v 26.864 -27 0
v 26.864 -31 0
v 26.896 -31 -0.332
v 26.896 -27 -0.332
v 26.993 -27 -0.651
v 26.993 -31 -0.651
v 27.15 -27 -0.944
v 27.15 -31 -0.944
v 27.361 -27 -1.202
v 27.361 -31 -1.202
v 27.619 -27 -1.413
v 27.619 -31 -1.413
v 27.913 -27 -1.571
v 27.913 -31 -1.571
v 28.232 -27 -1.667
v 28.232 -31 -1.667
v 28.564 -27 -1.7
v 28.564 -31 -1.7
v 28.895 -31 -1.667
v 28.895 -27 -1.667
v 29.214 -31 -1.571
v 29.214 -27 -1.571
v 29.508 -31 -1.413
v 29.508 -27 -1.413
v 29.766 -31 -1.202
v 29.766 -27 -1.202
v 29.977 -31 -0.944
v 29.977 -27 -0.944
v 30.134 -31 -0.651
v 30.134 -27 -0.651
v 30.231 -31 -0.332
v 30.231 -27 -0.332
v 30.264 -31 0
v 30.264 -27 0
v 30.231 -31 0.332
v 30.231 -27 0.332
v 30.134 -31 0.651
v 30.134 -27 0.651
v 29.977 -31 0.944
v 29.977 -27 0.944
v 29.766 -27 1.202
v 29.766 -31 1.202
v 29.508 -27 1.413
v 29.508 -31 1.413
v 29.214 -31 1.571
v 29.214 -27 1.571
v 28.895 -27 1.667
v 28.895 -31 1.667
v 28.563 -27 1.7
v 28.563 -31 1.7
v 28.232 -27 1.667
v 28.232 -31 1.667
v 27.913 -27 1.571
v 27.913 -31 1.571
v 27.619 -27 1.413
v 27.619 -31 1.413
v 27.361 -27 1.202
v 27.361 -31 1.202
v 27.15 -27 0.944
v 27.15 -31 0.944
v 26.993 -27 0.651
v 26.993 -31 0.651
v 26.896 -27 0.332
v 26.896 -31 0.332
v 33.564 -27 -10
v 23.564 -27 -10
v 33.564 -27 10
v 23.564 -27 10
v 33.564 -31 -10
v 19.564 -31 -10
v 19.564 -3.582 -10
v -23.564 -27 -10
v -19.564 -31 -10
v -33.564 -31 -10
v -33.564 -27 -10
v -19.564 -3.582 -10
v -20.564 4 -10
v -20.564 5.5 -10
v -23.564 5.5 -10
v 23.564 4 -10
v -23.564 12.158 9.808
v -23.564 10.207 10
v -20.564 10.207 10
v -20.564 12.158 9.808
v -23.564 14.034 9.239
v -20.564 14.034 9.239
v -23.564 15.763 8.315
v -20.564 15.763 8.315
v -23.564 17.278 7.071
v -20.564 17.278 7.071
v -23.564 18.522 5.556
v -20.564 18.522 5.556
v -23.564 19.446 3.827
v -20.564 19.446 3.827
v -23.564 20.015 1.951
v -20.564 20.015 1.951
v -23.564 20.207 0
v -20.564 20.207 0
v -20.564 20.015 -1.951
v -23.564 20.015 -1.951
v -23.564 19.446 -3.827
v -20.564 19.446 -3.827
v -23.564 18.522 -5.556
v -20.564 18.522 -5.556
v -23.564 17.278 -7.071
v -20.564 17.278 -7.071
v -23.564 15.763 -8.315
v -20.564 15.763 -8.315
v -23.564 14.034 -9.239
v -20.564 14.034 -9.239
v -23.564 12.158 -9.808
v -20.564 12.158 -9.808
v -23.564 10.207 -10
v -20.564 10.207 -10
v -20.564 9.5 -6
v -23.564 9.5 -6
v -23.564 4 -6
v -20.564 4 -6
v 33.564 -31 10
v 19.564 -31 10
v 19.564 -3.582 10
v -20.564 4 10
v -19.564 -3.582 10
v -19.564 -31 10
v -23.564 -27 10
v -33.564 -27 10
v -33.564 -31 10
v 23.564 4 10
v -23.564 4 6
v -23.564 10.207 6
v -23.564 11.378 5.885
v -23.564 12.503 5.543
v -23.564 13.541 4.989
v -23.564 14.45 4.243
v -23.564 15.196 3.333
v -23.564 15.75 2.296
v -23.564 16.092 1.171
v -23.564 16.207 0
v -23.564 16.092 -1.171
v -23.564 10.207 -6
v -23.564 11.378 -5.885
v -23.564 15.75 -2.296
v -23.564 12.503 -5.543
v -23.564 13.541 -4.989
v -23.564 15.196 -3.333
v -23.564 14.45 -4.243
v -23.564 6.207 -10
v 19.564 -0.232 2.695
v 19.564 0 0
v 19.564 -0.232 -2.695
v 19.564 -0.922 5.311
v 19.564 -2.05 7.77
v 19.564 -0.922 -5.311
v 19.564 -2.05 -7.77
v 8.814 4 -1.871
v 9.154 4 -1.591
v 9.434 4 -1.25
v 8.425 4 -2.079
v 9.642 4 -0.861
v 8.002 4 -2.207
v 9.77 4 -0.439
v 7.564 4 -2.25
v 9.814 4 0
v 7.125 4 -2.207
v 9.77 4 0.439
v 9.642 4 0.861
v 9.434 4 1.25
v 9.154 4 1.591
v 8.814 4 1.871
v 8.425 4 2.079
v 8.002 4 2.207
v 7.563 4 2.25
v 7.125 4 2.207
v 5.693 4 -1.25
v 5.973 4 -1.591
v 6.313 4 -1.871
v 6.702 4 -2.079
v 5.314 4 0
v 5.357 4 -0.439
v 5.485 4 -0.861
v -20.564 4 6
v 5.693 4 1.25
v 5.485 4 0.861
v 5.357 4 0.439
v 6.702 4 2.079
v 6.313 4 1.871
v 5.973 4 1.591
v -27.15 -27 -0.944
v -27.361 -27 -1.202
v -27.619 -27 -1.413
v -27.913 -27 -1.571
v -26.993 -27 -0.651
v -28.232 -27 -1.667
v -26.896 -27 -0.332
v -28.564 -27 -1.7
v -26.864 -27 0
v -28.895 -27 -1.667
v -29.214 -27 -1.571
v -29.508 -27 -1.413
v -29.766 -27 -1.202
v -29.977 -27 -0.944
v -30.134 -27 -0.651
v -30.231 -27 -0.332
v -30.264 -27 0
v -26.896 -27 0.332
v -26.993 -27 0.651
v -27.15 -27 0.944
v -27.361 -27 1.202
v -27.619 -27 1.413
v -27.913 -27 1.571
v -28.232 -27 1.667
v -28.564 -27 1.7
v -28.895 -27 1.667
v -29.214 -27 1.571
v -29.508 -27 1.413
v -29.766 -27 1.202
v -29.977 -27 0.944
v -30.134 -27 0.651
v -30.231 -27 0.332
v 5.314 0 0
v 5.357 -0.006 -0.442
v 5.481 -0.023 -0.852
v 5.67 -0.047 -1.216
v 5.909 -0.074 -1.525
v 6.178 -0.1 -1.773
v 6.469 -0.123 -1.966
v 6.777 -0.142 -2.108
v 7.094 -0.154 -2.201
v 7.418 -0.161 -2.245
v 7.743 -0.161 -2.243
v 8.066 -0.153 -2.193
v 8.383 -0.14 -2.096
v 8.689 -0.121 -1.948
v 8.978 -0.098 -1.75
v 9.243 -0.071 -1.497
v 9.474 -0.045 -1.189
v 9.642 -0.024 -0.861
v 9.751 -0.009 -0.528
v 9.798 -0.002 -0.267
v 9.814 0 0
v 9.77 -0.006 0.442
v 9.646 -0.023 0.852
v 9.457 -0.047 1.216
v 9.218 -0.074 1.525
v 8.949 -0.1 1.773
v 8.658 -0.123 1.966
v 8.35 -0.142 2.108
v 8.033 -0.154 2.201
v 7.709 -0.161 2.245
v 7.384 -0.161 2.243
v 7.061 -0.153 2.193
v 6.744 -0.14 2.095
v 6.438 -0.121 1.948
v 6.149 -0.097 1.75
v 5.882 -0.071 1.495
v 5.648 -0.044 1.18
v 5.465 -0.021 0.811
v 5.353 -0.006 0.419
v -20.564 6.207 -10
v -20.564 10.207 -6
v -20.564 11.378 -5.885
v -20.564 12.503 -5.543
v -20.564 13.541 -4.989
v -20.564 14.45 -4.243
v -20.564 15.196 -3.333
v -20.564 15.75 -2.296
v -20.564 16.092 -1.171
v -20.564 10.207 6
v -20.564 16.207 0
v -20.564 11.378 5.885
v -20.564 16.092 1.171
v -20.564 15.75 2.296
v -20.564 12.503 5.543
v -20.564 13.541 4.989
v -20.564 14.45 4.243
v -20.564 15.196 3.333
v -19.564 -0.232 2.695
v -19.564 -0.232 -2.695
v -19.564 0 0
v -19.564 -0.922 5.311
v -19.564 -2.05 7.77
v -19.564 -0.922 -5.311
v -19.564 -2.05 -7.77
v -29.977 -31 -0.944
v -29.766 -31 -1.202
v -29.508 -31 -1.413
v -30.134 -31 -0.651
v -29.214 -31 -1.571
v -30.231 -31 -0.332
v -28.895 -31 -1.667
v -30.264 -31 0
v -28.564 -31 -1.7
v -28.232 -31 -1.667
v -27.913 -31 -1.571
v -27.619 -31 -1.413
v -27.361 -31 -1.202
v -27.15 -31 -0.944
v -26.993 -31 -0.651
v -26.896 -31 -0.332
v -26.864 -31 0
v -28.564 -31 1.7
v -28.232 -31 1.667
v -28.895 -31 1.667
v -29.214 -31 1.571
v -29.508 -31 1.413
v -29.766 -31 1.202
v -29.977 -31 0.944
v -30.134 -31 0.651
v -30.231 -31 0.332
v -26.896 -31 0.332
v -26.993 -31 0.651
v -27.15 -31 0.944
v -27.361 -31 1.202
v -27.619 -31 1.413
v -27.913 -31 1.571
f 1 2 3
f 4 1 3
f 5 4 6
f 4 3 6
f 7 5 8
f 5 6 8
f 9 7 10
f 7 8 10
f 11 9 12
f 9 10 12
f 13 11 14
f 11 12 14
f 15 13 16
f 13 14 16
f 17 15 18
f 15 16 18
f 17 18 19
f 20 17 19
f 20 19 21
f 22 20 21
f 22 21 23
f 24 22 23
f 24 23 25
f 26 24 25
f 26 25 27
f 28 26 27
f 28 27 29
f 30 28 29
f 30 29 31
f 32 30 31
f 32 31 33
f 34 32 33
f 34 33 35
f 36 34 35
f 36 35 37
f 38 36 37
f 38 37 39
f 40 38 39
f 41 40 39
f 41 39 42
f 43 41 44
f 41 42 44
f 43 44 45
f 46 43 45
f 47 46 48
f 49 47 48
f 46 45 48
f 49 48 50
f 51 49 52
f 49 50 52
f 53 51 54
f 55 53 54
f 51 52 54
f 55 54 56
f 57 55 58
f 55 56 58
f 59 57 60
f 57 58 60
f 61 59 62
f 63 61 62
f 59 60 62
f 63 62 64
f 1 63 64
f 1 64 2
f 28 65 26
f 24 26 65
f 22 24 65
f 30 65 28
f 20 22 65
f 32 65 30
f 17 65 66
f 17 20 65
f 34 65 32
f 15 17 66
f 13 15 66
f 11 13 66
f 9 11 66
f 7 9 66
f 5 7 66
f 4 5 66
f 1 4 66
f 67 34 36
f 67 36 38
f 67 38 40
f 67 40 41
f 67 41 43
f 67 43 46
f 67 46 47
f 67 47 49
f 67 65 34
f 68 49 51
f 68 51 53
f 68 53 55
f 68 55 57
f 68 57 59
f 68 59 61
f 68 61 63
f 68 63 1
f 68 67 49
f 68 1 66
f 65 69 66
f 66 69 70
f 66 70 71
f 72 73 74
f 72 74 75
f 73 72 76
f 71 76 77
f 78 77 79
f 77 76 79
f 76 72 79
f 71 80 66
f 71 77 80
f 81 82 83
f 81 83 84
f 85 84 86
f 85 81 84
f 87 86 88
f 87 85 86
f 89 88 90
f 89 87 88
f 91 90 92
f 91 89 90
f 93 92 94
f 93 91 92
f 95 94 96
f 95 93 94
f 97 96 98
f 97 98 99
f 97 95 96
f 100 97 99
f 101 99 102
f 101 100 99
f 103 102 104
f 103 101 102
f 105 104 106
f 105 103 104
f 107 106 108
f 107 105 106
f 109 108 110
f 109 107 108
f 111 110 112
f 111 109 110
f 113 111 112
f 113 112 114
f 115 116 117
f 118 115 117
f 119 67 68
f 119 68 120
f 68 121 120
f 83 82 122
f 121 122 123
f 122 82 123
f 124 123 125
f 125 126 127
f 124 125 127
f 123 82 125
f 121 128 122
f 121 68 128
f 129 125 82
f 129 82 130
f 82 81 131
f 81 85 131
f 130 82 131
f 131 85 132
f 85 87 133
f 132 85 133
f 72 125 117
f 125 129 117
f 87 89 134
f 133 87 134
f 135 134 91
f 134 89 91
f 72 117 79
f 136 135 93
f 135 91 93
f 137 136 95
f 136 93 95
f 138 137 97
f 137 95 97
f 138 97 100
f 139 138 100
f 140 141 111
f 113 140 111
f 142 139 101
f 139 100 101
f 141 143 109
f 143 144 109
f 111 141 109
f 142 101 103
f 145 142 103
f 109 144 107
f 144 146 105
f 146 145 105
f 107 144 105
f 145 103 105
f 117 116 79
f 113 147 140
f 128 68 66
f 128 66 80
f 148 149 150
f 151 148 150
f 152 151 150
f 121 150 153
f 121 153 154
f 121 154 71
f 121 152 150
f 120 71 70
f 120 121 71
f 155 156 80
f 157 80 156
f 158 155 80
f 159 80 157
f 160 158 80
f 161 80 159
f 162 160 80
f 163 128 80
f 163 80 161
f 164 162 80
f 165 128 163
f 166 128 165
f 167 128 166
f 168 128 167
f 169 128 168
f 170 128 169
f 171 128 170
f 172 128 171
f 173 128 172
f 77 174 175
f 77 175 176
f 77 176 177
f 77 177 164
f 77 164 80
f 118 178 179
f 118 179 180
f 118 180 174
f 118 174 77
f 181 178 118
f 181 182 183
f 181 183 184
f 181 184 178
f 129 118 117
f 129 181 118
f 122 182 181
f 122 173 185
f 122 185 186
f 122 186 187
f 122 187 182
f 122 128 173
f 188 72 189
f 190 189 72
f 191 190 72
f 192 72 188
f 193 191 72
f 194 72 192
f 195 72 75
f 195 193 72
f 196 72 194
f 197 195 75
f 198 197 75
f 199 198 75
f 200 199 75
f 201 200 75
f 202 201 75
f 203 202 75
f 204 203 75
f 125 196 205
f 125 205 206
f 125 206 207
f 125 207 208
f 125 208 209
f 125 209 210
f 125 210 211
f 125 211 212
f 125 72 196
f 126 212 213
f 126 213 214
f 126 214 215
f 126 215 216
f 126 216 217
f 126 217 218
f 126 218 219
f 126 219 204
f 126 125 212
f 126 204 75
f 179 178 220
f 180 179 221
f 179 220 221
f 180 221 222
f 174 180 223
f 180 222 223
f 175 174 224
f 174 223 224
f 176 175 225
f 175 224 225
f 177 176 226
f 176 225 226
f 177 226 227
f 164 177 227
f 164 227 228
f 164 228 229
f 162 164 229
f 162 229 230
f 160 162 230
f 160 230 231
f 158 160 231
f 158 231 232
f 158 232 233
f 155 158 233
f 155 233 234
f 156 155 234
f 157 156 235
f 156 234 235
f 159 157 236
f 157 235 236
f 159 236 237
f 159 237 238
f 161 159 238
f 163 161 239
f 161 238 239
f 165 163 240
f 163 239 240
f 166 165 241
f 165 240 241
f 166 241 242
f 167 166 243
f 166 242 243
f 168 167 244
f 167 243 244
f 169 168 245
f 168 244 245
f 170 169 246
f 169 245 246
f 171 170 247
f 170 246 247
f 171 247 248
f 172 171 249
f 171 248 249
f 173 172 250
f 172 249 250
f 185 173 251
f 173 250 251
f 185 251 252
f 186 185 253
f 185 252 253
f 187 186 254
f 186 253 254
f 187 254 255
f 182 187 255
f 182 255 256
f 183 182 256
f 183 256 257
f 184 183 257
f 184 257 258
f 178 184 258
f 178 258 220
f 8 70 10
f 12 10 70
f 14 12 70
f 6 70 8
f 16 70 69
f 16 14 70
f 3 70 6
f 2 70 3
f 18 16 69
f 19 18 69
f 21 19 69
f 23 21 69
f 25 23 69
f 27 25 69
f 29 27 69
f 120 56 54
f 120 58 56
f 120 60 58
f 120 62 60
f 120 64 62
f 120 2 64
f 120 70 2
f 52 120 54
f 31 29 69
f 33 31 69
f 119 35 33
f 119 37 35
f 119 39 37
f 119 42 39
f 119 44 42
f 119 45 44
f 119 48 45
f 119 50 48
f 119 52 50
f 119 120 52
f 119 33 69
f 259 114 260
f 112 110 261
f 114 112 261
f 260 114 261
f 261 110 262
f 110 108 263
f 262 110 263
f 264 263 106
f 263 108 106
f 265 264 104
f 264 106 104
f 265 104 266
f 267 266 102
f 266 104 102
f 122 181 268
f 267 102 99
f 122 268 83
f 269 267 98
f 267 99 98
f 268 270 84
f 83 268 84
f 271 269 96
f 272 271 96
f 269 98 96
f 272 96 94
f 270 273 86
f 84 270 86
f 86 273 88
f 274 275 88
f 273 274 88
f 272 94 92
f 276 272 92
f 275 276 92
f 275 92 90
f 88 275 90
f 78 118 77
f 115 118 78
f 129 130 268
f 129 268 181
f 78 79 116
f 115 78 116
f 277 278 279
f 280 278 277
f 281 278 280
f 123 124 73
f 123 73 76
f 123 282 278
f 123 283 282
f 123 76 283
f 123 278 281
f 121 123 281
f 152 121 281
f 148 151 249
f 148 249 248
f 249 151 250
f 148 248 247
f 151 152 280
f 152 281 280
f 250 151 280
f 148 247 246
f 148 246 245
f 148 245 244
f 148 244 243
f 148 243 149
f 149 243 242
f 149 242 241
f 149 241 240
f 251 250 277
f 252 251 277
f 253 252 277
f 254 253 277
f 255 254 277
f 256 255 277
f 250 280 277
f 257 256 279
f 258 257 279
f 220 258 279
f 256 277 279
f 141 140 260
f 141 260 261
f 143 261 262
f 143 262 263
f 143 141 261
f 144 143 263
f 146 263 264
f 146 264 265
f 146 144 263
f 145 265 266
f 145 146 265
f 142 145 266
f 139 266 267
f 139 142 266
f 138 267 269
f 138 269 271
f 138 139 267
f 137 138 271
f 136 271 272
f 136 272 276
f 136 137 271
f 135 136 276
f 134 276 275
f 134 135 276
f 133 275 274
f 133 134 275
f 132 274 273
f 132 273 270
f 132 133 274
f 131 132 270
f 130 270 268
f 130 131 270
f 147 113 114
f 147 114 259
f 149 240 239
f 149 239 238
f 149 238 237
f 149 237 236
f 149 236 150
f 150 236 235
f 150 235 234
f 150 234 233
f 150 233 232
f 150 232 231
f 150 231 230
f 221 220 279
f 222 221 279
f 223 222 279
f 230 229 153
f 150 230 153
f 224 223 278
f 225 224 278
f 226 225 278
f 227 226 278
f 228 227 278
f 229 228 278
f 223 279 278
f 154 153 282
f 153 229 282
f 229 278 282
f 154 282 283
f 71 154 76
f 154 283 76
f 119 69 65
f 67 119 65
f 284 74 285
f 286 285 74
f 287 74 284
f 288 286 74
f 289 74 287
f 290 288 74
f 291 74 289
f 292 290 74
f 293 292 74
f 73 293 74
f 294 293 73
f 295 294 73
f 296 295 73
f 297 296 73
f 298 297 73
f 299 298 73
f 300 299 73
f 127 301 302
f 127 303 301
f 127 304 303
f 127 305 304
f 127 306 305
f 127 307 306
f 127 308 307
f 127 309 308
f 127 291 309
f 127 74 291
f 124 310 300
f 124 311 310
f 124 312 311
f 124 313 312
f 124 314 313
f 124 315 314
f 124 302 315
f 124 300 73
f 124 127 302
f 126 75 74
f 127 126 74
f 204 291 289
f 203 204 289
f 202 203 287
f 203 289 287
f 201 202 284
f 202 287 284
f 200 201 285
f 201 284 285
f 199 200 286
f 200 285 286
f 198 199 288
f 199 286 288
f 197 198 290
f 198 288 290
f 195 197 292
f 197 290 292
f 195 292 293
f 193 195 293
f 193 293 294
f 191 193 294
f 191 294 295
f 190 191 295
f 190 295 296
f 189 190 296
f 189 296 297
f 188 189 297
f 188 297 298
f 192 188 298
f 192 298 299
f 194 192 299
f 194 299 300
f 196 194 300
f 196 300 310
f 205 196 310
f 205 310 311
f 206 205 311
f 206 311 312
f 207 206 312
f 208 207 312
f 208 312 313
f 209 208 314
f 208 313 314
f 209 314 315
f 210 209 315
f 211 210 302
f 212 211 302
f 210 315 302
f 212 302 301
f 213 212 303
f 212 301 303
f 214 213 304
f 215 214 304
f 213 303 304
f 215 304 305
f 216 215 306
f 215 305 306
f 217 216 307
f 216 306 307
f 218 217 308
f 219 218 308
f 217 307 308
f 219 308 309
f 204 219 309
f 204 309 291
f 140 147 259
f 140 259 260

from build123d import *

# Parameters (mm, degrees)
BOSS_EXTRUDE1_DEPTH      = 10
BOSS_EXTRUDE2_START      = -19.5635
BOSS_EXTRUDE2_DEPTH      = 39.127
M3_CLEARANCE_HOLE1_D     = 3.4
M3_CLEARANCE_HOLE1_DEPTH = 7.5
M3_CLEARANCE_HOLE1_TIP   = 1.021463052
M4_CLEARANCE_HOLE1_D     = 4.5
BOSS_EXTRUDE3_DEPTH      = 3


with BuildPart() as part:
    # Sketch1 → Boss-Extrude1 (new, symmetric)
    with BuildSketch(Plane.XY):
        Polygon((-19.5635, 0), (19.5635, 0), (19.5635, -31), (33.5635, -31), (33.5635, -27), (23.5635, -27), (23.5635, 4), (-23.5635, 4), (-23.5635, -27), (-33.5635, -27), (-33.5635, -31), (-19.5635, -31), align=None)
    extrude(amount=BOSS_EXTRUDE1_DEPTH, both=True)

    # Sketch2 → Boss-Extrude2 (add)
    with BuildSketch(Plane(origin=(0, 0, 0), x_dir=(0, 0, -1), z_dir=(1, 0, 0)).offset(BOSS_EXTRUDE2_START)):
        with BuildLine():
            Line((5e-09, 0), (-10, 0))
            Line((-10, 0), (-10, -3.581906476))
            ThreePointArc((-10, -3.581906476), (-5.311074607, -0.922492235), (5e-09, 0))
        make_face()
        with BuildLine():
            Line((10, 0), (5e-09, 0))
            ThreePointArc((5e-09, 0), (5.311074611, -0.922492237), (10, -3.581906476))
            Line((10, -3.581906476), (10, 0))
        make_face()
    extrude(amount=BOSS_EXTRUDE2_DEPTH)

    # M3 Clearance Hole1
    with Locations(Plane(origin=(0, -27, 0), x_dir=(1, 0, 0), z_dir=(0, 1, 0))):
        with Locations((28.5635, 0), (-28.5635, 0)):
            Hole(M3_CLEARANCE_HOLE1_D / 2, depth=M3_CLEARANCE_HOLE1_DEPTH)
            with Locations((0, 0, -(M3_CLEARANCE_HOLE1_DEPTH + M3_CLEARANCE_HOLE1_TIP / 2))):  # 118° drill point
                Cone(0, M3_CLEARANCE_HOLE1_D / 2, M3_CLEARANCE_HOLE1_TIP, mode=Mode.SUBTRACT)

    # M4 Clearance Hole1 (through all)
    with Locations(Plane(origin=(0, 4, 0), x_dir=(1, 0, 0), z_dir=(0, 1, 0))):
        with Locations((7.5635, 0)):
            Hole(M4_CLEARANCE_HOLE1_D / 2)

    # Sketch7 → Boss-Extrude3 (add)
    with BuildSketch(Plane.ZY.offset(23.5635)):
        Polygon((-10, 4), (-10, 5.5), (-6, 9.5), (-6, 4), align=None)
        with BuildLine():
            Line((-10, 6.207106781), (-6, 10.207106781))
            ThreePointArc((-6, 10.207106781), (0, 16.207106781), (6, 10.207106781))
            Line((6, 10.207106781), (6, 4))
            Line((6, 4), (10, 4))
            Line((10, 4), (10, 10.207106781))
            ThreePointArc((10, 10.207106781), (0, 20.207106781), (-10, 10.207106781))
            Line((-10, 10.207106781), (-10, 6.207106781))
        make_face()
    extrude(amount=-BOSS_EXTRUDE3_DEPTH)


solid = part.part
